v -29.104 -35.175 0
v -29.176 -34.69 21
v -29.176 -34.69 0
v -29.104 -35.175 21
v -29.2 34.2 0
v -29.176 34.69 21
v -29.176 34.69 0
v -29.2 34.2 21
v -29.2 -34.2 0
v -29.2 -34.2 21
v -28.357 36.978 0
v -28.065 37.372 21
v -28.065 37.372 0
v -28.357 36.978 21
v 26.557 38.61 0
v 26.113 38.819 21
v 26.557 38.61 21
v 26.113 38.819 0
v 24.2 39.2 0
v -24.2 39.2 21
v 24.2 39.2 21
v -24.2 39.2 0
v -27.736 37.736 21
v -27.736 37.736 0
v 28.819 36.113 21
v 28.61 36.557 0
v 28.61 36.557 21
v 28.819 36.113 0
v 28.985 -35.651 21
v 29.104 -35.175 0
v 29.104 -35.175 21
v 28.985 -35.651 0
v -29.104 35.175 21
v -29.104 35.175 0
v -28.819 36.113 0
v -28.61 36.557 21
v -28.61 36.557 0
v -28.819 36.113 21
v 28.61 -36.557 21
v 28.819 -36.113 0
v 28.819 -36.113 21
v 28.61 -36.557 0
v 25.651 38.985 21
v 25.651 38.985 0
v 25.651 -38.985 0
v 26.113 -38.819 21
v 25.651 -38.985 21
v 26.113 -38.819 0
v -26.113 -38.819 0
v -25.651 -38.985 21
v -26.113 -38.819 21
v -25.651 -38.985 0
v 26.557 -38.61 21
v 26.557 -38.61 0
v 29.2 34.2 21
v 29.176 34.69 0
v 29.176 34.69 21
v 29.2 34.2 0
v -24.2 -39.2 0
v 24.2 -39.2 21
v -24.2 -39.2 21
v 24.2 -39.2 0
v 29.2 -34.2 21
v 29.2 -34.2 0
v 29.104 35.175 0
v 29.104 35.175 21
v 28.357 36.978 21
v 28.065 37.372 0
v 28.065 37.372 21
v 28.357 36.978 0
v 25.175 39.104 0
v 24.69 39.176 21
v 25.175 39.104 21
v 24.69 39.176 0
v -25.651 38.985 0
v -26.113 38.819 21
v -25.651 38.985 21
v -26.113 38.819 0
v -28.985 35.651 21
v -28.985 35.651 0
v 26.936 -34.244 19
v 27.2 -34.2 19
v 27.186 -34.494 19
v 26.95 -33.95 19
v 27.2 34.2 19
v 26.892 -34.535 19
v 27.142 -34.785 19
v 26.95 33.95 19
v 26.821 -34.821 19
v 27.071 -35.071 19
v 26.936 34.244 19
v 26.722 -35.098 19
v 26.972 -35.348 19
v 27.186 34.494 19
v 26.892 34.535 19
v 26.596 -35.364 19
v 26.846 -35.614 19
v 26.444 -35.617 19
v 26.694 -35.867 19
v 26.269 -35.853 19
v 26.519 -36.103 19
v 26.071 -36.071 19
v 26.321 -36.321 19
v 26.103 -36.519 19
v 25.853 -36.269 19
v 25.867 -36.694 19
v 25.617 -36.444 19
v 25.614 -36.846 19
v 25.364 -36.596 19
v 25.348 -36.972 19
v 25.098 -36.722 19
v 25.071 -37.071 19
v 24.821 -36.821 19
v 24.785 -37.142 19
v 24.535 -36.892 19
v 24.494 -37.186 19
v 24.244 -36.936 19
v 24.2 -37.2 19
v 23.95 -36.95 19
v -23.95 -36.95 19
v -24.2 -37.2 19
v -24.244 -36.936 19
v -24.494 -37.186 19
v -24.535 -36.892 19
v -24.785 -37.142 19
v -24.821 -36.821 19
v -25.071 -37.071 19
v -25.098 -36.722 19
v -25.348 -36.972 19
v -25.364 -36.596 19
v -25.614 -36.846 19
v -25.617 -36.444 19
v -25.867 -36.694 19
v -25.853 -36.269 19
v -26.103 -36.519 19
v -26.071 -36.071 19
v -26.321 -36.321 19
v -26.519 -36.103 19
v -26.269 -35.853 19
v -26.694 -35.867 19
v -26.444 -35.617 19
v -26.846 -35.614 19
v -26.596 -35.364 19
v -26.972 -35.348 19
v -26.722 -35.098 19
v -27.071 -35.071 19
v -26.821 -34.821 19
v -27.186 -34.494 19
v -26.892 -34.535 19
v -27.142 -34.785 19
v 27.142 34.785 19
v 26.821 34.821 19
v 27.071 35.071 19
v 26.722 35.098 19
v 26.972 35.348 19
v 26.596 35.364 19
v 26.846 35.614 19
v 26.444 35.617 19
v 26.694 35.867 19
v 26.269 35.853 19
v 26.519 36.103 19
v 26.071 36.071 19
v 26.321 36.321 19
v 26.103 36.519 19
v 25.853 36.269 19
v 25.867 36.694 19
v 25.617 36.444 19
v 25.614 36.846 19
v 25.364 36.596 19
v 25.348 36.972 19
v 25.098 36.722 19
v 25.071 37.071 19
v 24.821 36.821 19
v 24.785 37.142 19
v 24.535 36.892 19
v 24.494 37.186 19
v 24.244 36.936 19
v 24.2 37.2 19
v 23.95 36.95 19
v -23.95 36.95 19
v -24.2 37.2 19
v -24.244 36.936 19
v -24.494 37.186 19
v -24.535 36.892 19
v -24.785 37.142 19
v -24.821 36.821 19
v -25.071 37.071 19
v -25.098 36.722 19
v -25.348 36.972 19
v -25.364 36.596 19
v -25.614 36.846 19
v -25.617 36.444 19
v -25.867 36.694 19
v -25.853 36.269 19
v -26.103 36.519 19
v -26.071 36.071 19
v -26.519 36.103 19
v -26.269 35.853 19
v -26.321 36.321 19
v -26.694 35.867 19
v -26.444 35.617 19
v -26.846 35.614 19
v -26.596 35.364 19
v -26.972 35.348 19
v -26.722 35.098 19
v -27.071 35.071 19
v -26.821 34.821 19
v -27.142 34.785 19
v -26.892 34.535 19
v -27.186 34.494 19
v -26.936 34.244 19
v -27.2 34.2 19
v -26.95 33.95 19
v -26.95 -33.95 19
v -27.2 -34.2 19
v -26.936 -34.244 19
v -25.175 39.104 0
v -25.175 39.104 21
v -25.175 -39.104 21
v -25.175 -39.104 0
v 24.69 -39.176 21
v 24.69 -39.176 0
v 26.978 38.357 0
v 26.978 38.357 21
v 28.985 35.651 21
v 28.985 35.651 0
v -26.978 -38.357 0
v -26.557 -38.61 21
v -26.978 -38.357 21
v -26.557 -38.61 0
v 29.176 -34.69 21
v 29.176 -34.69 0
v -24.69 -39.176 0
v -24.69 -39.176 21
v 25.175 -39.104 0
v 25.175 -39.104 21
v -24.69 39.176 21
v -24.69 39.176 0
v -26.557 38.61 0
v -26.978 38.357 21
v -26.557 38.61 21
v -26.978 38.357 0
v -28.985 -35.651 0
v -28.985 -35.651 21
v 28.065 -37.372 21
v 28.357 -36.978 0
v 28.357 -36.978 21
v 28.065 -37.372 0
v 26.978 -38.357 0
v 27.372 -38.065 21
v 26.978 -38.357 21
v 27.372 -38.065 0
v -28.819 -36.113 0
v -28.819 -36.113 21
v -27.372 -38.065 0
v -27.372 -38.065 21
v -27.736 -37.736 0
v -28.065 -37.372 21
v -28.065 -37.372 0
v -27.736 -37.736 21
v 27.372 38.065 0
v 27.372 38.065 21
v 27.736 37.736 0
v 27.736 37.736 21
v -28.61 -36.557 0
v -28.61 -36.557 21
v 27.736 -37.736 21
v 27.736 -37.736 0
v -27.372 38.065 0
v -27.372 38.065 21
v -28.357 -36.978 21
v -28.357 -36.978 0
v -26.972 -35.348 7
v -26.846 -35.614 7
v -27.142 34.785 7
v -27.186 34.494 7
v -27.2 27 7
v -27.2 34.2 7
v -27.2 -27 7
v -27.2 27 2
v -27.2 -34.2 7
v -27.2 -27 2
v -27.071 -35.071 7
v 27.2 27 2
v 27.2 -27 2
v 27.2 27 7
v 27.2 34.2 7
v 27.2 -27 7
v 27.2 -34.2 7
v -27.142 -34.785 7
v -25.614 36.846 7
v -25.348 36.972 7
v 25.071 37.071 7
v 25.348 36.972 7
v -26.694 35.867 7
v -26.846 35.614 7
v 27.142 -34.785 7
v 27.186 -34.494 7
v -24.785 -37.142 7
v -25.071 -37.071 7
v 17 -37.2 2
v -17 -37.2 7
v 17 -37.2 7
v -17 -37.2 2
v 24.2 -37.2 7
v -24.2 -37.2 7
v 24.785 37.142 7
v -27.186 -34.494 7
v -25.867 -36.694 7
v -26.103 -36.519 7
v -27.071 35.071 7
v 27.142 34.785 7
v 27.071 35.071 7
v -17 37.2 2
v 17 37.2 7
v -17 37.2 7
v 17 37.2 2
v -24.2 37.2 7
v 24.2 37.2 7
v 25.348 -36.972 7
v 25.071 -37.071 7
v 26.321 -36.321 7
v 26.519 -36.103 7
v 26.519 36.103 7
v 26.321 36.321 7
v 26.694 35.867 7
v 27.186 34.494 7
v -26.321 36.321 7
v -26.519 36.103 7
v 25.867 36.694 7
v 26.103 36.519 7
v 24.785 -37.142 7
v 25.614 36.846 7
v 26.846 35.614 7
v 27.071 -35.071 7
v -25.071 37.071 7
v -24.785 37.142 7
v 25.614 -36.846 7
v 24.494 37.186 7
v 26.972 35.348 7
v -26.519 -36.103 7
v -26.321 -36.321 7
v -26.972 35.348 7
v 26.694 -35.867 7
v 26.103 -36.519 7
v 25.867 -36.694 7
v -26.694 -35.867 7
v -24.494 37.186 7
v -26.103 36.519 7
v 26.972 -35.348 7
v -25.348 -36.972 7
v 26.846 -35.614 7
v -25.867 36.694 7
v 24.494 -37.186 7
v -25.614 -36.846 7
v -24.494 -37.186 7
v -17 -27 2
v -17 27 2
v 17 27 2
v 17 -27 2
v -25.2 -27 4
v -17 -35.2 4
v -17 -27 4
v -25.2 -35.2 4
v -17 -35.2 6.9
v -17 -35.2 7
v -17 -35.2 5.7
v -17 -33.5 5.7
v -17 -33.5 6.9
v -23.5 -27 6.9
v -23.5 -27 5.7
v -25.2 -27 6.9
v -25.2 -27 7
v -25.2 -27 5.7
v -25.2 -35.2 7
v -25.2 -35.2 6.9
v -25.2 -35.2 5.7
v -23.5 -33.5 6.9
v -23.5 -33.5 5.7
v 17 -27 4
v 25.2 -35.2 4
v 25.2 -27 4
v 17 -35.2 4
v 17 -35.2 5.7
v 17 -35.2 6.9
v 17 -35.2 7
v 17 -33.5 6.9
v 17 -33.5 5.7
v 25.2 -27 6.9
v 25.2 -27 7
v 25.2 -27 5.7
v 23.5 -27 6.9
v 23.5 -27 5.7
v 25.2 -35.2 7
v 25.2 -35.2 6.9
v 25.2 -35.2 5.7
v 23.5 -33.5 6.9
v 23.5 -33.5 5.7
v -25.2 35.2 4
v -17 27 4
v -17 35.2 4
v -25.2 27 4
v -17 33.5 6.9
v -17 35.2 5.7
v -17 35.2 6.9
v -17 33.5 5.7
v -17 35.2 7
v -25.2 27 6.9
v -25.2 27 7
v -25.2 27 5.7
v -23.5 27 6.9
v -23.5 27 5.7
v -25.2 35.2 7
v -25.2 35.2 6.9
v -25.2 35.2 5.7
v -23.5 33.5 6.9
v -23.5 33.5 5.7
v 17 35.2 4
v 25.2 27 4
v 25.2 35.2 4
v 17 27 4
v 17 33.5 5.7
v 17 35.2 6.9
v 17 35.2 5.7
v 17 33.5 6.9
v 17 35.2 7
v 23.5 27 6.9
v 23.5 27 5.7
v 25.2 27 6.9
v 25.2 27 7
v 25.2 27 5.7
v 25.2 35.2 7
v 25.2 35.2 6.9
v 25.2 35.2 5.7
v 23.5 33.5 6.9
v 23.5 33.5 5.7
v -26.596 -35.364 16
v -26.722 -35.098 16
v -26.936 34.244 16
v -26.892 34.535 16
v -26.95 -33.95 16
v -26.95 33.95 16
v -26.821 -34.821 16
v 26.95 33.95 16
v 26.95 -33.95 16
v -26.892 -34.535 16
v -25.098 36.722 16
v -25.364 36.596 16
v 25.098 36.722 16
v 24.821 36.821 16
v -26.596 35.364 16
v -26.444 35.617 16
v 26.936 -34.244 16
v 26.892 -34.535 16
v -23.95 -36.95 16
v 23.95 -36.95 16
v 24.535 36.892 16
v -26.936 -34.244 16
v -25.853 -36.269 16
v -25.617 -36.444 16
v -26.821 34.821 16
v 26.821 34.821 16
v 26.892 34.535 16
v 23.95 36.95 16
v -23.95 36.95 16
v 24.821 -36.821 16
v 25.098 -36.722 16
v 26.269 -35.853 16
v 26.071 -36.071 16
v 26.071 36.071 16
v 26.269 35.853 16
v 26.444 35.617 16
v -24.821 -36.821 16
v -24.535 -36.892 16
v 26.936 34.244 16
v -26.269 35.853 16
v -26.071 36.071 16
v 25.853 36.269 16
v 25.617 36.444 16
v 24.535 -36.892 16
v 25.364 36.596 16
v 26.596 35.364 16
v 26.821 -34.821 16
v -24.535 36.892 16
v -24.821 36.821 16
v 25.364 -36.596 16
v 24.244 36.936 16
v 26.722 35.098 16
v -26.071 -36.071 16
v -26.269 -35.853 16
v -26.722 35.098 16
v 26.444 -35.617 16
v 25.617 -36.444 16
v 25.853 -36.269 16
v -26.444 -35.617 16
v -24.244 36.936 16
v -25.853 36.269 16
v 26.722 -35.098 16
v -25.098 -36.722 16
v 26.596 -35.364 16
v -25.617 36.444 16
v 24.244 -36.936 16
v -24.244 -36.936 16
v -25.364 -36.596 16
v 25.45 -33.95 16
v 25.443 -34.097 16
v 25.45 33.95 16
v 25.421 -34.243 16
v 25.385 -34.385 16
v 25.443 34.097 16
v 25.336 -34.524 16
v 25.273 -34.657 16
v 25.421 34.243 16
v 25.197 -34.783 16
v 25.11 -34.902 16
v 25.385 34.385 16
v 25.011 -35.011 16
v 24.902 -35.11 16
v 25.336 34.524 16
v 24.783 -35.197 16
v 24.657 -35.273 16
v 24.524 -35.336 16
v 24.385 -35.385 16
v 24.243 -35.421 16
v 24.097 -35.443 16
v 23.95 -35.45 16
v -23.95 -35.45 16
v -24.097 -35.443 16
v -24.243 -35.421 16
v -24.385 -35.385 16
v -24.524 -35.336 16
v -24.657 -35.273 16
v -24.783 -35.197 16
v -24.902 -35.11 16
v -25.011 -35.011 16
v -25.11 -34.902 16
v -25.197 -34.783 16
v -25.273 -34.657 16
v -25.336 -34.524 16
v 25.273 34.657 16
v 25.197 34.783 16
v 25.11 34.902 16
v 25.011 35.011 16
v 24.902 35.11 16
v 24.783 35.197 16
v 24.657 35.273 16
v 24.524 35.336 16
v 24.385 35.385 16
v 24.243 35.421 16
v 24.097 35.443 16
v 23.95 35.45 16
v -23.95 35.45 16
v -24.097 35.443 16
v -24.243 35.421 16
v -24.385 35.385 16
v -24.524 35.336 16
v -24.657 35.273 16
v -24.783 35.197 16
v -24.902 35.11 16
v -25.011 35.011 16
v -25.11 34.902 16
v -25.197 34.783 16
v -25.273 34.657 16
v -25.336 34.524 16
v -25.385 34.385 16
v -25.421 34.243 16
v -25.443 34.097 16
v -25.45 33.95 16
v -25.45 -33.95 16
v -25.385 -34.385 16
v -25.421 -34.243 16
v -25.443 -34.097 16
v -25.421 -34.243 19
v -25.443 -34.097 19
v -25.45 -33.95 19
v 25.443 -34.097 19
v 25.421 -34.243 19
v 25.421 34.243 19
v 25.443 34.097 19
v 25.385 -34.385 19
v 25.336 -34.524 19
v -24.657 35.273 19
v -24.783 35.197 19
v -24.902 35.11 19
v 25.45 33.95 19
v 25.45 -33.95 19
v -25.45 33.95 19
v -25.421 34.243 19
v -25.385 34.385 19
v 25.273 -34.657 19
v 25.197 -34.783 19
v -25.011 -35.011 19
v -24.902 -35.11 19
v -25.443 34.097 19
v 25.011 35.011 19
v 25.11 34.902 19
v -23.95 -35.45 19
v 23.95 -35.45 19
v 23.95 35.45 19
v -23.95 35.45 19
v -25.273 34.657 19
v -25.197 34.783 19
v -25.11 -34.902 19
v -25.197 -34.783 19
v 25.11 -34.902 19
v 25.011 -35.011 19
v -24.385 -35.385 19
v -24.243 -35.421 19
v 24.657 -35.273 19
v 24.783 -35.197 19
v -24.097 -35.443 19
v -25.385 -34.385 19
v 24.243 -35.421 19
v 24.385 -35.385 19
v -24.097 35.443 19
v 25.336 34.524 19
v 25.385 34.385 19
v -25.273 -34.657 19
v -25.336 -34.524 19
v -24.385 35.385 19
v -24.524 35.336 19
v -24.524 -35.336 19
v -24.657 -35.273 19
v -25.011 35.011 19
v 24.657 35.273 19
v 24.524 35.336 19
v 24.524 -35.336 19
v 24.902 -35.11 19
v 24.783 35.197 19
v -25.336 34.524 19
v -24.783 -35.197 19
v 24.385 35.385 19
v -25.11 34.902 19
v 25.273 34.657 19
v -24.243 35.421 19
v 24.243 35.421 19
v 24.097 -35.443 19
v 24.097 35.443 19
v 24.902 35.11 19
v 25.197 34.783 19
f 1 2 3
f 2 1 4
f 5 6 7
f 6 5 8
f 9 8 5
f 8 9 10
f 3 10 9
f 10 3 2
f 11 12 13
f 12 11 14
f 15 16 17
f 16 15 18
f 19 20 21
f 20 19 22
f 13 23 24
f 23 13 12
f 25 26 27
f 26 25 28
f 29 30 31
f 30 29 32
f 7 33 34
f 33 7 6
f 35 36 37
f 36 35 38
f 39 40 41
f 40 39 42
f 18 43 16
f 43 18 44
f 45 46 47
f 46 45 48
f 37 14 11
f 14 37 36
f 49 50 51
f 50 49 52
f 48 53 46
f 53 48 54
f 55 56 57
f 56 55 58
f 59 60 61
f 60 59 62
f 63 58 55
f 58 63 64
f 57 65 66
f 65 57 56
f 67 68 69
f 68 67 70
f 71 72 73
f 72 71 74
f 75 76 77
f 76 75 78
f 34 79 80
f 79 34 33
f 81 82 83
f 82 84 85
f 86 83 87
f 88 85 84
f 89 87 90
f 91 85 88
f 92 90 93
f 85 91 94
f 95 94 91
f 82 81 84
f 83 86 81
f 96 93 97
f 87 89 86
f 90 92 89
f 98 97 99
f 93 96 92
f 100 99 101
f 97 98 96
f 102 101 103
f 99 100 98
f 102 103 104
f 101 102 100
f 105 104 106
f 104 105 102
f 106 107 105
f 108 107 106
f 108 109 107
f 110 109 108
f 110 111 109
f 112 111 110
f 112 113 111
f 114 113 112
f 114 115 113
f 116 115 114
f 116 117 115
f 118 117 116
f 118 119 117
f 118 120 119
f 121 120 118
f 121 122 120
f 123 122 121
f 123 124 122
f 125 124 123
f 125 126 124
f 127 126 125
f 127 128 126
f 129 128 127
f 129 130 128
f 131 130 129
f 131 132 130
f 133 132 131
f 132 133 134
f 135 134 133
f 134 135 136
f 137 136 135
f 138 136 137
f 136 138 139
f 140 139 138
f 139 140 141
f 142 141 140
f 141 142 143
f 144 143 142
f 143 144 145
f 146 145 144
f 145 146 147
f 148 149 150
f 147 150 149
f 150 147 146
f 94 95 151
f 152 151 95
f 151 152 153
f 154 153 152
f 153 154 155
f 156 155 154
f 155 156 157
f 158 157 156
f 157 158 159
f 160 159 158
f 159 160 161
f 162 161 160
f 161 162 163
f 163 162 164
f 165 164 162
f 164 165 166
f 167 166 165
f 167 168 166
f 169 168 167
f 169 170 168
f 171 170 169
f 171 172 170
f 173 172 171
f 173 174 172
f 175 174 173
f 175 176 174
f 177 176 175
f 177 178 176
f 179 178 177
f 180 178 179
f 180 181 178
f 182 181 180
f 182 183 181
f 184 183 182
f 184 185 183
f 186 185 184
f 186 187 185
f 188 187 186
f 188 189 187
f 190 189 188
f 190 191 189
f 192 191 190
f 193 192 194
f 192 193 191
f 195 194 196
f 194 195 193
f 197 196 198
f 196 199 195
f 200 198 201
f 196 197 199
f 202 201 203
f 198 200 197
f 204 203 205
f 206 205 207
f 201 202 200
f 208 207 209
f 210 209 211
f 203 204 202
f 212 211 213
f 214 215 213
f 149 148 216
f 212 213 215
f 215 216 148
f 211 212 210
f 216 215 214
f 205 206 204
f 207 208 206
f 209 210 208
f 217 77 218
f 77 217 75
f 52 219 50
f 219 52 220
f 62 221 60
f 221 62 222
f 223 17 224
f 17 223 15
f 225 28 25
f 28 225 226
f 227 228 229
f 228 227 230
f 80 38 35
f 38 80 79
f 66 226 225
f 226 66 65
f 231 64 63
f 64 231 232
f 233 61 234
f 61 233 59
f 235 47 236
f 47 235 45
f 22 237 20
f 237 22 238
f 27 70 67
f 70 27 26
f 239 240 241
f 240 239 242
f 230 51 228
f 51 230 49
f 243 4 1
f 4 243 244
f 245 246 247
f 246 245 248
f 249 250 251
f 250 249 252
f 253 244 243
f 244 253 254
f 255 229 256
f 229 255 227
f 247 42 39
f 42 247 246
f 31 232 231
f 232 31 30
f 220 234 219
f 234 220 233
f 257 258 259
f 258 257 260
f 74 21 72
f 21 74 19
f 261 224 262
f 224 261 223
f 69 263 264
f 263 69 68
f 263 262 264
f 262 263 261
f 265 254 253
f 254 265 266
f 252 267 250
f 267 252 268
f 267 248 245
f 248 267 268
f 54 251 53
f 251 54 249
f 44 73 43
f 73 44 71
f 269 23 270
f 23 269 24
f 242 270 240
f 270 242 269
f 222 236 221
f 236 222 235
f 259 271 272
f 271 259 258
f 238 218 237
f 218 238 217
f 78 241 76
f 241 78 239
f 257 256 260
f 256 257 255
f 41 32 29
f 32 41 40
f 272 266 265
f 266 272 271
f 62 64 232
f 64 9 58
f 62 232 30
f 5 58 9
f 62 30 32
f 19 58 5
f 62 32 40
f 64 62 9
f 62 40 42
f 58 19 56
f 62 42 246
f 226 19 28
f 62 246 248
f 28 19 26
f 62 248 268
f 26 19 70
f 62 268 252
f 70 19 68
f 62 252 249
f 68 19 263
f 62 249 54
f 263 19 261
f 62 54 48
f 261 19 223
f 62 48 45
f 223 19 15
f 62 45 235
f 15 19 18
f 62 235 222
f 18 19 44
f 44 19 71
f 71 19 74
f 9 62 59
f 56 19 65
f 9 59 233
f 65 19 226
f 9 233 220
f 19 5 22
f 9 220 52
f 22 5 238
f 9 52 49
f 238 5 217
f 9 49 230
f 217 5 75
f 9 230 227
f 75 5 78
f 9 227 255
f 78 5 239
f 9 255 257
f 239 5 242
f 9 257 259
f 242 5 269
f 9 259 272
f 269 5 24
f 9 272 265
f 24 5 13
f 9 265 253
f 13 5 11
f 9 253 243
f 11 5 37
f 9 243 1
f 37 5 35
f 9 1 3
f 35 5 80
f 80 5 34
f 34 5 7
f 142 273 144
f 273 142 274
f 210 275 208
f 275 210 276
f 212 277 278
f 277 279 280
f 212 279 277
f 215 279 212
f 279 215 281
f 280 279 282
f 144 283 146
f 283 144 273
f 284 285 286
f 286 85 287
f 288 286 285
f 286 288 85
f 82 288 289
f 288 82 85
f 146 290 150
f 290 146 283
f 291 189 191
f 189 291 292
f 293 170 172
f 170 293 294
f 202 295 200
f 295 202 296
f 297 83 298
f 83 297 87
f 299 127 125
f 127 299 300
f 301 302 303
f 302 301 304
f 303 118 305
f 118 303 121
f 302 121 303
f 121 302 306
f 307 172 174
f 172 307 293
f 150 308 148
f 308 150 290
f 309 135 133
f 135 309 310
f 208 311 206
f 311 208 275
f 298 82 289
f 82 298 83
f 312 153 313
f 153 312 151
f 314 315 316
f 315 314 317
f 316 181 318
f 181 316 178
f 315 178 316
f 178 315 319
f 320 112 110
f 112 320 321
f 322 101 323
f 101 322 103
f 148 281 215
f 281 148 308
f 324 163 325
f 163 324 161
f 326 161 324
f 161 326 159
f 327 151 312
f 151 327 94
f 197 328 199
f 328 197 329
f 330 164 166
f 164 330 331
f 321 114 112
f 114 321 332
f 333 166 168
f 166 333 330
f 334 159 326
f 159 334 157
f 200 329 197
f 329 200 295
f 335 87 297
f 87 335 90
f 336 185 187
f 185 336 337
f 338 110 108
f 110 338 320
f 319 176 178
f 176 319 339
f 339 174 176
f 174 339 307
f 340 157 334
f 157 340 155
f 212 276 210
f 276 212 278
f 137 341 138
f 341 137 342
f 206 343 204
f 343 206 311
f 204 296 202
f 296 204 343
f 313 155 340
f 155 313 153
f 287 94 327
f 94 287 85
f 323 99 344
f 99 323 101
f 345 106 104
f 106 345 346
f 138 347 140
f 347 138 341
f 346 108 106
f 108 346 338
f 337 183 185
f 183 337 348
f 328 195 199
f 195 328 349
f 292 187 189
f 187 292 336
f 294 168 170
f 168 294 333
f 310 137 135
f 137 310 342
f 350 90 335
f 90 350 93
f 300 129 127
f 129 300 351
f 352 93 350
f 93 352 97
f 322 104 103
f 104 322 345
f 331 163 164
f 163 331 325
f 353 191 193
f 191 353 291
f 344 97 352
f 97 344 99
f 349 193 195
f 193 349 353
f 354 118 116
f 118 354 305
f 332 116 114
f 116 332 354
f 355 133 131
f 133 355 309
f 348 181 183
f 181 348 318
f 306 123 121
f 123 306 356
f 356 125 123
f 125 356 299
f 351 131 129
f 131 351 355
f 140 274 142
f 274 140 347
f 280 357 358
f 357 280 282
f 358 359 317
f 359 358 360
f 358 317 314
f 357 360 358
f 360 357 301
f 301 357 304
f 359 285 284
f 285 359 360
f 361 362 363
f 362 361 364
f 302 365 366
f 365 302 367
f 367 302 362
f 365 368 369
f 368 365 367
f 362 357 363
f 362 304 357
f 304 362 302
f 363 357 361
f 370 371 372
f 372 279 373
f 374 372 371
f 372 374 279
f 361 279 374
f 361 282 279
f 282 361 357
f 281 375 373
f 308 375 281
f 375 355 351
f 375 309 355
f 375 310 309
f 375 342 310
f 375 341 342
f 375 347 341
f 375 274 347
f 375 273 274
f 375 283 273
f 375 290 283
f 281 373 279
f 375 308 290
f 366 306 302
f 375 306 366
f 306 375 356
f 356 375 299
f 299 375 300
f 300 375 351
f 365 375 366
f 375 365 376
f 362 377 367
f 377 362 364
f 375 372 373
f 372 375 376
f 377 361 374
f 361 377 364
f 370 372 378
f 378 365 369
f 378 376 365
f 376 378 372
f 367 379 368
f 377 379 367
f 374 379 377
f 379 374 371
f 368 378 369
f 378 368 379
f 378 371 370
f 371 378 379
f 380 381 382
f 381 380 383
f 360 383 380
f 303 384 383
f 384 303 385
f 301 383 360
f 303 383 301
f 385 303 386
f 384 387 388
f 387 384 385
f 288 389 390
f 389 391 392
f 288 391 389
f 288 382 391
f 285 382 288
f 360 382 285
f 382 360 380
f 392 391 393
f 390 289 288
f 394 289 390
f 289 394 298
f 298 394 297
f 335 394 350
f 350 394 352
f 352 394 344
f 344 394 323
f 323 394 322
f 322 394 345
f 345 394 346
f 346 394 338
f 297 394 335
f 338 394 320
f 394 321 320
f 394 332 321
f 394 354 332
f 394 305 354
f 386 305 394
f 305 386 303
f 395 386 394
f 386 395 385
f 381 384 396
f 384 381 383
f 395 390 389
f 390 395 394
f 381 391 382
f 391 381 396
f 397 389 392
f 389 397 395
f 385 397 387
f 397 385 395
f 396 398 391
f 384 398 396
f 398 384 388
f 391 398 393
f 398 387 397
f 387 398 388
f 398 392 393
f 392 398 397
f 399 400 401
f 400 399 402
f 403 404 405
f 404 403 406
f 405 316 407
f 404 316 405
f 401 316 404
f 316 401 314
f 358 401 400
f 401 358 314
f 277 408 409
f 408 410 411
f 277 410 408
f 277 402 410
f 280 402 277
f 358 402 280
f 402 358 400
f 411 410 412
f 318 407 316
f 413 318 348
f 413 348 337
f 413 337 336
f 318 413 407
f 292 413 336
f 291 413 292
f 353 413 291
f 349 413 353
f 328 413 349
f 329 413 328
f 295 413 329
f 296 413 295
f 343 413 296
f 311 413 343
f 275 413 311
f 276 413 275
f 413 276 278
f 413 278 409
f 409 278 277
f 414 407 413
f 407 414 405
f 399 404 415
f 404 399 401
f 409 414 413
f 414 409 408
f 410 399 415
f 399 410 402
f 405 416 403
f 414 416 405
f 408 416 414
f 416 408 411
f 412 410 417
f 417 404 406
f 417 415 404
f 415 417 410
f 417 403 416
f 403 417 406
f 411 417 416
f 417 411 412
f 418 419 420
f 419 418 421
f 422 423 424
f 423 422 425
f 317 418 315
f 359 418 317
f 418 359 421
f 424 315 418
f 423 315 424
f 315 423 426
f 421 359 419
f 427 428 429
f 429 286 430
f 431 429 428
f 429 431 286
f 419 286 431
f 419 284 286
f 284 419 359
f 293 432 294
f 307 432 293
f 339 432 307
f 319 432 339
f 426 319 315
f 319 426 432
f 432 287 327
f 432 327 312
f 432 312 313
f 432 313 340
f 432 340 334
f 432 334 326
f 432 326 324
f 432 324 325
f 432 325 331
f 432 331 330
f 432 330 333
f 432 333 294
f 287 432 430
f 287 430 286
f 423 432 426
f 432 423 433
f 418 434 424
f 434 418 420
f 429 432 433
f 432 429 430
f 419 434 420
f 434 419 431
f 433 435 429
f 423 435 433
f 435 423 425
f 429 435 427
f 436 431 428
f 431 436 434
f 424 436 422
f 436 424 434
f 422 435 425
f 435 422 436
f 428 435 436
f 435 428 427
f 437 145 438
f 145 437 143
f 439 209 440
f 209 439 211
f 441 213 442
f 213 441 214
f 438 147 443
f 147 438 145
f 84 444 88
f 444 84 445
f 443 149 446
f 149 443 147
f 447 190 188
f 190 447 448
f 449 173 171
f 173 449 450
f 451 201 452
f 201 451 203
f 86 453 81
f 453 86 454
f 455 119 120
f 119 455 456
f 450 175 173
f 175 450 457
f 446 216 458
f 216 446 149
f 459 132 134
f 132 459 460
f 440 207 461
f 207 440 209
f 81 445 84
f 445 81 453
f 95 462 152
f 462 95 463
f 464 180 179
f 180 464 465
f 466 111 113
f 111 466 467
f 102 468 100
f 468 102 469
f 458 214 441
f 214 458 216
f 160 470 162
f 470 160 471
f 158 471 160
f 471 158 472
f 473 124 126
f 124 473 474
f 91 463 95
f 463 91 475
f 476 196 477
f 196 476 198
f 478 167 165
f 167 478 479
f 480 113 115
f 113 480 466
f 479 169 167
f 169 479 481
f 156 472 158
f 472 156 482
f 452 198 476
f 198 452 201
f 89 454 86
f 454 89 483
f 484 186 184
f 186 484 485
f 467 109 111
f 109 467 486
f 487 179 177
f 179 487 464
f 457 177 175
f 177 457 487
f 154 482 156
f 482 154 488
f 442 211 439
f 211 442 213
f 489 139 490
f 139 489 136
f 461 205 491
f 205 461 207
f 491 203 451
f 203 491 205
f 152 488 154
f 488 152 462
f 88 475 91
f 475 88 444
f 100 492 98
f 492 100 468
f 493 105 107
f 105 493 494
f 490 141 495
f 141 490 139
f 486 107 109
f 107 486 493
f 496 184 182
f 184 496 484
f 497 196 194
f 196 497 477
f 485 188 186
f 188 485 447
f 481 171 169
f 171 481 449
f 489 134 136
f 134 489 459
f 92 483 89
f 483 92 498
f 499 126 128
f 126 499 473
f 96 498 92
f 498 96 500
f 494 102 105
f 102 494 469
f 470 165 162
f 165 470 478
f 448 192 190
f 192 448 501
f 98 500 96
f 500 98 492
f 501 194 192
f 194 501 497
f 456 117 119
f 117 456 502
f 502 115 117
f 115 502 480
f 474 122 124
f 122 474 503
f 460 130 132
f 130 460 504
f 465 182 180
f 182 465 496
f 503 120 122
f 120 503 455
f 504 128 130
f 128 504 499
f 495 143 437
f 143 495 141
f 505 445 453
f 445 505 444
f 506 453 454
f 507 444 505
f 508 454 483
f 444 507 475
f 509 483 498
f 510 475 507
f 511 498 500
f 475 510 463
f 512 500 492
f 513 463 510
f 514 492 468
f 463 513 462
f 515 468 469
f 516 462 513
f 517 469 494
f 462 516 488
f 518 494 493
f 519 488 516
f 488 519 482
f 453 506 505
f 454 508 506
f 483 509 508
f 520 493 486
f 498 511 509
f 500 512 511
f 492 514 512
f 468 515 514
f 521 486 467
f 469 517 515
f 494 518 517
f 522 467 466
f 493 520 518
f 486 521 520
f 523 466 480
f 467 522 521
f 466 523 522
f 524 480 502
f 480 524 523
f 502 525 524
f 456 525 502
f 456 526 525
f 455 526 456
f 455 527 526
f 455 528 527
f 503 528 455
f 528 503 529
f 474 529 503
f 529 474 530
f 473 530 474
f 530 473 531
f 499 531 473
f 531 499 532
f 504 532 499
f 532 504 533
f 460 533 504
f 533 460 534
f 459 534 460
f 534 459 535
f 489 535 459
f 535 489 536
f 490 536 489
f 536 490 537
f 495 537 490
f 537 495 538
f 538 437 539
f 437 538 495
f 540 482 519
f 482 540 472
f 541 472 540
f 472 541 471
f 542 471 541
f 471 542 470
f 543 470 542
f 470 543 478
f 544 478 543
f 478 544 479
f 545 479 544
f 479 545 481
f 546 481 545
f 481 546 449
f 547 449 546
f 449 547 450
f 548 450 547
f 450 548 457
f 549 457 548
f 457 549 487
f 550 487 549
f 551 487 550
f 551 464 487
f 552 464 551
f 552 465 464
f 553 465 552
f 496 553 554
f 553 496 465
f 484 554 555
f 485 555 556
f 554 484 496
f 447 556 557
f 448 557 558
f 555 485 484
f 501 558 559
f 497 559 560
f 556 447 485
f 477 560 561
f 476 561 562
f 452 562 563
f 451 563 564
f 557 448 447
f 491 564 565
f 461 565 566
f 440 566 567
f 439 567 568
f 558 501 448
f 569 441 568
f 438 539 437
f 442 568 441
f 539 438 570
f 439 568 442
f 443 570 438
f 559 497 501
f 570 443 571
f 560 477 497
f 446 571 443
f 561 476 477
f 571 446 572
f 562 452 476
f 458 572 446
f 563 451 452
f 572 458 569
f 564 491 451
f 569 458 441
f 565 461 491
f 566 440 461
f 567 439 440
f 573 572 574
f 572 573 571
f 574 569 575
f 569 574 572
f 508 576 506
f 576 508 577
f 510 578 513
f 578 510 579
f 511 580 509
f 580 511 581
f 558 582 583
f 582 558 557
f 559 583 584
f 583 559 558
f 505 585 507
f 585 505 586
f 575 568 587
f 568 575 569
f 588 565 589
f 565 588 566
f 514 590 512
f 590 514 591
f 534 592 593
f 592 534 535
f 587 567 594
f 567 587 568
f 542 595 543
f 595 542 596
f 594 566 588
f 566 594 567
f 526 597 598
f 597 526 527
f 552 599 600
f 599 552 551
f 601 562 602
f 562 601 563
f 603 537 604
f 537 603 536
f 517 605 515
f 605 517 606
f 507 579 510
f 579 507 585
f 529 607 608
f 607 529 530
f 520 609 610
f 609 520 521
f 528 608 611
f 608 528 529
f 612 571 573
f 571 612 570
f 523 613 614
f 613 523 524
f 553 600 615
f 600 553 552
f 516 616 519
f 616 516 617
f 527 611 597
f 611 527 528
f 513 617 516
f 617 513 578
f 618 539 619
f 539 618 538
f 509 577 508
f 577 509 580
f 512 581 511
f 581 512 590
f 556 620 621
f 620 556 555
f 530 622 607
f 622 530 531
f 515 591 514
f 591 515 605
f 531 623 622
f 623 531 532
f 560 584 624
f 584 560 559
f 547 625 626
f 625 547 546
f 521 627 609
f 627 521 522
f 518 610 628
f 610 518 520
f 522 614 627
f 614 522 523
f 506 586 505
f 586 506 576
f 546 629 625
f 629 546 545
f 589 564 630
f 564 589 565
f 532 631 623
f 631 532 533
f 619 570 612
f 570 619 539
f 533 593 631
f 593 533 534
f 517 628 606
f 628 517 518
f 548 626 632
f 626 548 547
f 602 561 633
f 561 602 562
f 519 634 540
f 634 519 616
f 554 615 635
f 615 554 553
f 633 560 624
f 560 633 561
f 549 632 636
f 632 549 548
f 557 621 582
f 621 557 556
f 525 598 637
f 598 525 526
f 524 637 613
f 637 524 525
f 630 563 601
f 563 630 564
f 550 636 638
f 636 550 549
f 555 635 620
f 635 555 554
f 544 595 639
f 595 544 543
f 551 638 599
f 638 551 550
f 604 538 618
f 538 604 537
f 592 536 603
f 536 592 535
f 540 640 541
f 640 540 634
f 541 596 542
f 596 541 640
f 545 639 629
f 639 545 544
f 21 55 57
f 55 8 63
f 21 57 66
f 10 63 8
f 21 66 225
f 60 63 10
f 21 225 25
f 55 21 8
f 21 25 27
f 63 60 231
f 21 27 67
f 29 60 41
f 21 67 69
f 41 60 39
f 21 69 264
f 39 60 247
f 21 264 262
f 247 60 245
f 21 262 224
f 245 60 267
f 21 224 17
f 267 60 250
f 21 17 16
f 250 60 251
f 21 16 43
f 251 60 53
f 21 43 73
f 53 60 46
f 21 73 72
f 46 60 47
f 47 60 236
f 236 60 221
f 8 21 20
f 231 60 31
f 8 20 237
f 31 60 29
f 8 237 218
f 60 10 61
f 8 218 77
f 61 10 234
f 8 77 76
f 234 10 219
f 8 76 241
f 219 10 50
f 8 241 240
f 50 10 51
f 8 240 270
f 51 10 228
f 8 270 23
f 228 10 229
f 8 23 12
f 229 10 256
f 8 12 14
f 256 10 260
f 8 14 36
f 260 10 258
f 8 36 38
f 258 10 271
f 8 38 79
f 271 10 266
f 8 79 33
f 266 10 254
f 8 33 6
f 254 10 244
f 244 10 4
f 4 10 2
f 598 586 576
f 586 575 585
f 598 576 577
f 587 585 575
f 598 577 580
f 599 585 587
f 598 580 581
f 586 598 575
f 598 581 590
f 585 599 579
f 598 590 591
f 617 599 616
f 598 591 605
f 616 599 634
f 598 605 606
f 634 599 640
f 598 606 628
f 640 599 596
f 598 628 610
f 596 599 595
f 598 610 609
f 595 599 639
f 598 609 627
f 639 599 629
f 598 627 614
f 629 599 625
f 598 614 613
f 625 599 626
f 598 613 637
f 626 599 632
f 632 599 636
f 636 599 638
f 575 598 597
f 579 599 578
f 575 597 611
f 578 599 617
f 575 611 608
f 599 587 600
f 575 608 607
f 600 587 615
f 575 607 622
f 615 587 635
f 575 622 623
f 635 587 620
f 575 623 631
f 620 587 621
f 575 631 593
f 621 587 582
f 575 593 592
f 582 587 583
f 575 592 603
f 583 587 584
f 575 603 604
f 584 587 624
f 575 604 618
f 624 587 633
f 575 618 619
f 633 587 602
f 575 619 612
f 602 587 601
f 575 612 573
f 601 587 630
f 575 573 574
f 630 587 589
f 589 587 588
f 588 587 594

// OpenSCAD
// file: ../../lib/cut_plane_viewer.scad
// ============================================================
//  cut_plane_viewer — interactive cut-plane viewer for the OpenSCAD GUI.
//
//  cut_plane_view(axis, pos, show) wraps a part and shows a section plane at
//  axis = pos four ways, so you sweep CUT_POS in the Customizer and read where
//  / how the plane cuts:
//    "off"   — just the part, no plane (the clean default view: this is why it can
//              live at the end of a main.scad without changing its default render).
//    "plane" — part + a translucent red plane at pos (WHERE it cuts).
//    "cut"   — part clipped at the plane (half-space): the cross-section in 3D,
//              in place (a cutaway view).
//    "slice" — the TRUE 2D cross-section, extruded thin and placed back ON the
//              cut plane (in situ): the clean outline, where it actually cuts.
//
//  Self-contained (no `use`/`include`): the 2D section uses the slice.scad
//  projection convention INLINE (z: img=XY · x: img=Y,Z · y: img=X,Z; det +1,
//  no mirror). So tools/make_assembly.py can either `use <cut_plane_viewer.scad>`
//  (in-repo project files) or copy these module defs verbatim into a portable,
//  dependency-free stl_assembly.scad — ONE source either way.
//
//  Inspection-only geometry (never part of a printed piece). It lives in lib/
//  because it is reusable .scad consumed by the main.scad front doors, even
//  though it is not a geometric primitive (see lib/CLAUDE.md). Drive it from a
//  Customizer file; never `include` (it would leak the
//  self-preview). The block between the first `module` and the Self-preview line
//  is what make_assembly inlines, so keep all state in module defaults (no
//  top-level constants there).
// ============================================================
module cut_plane_view(axis = "x", pos = 0, show = "off", plane_size = 300) {
    if (show == "off") children();
    else if (show == "cut") intersection() { children(); _cpv_half(axis, pos); }
    else if (show == "slice") _cpv_slice(axis, pos) children();
    else { children(); color([0.85, 0.10, 0.10, 0.33]) _cpv_plane(axis, pos, plane_size); }
}
module _cpv_plane(axis, pos, s = 300, th = 0.6) {
    if (axis == "x")      translate([pos, 0, 0]) cube([th, s, s], center = true);
    else if (axis == "y") translate([0, pos, 0]) cube([s, th, s], center = true);
    else                  translate([0, 0, pos]) cube([s, s, th], center = true);
}
module _cpv_half(axis, pos, b = 1000) {
    if (axis == "x")      translate([pos - b, -b/2, -b/2]) cube(b);
    else if (axis == "y") translate([-b/2, pos - b, -b/2]) cube(b);
    else                  translate([-b/2, -b/2, pos - b]) cube(b);
}
module _cpv_section(axis, pos) {
    if (axis == "z") projection(cut = true) translate([0, 0, -pos]) children();
    else if (axis == "x") projection(cut = true)
        multmatrix([[0,1,0,0],[0,0,1,0],[1,0,0,-pos],[0,0,0,1]]) children();
    else projection(cut = true)
        multmatrix([[1,0,0,0],[0,0,1,0],[0,-1,0,pos],[0,0,0,1]]) children();
}
module _cpv_slice(axis, pos, th = 0.6) {
    if (axis == "z") translate([0,0,pos])
        linear_extrude(th, center=true) _cpv_section("z", pos) children();
    else if (axis == "x") translate([pos,0,0]) rotate([90,0,90])
        linear_extrude(th, center=true) _cpv_section("x", pos) children();
    else translate([0,pos,0]) rotate([90,0,0])
        linear_extrude(th, center=true) _cpv_section("y", pos) children();
}

// ---------- Self-preview (top-level; `use <...>` ignores it — never `include`) ----------
$fn = 48;
cut_plane_view("x", 4, "cut") difference() { cube(30, center = true); sphere(18); }
// file: modules/example_config.scad
// ============================================================
//  example_config.scad — constants for the starter enclosure.
//
//  `include`d (not `use`d) by the pieces, so these are plain variables.
//  No geometry here, and no self-preview: an `include` would leak it into
//  every importer.
//
//  Every constant carries its provenance: MEASURED = verified with calipers
//  against the real part; ADJUST = an estimate, to be confirmed. Flip the tag
//  in place when the measurement arrives, and never delete the trail.
// ============================================================

// ---- the board this box houses ---------------------------------------------
// The defaults of the pcb_holder component: a generic 50 × 70 board. Swap these
// for your own and everything below follows.
BOX_PCB_W = 50;   // ADJUST: PCB width  (X, mm)
BOX_PCB_L = 70;   // ADJUST: PCB length (Y, mm)
BOX_PCB_T = 1.5;  // ADJUST: PCB thickness (mm)

// ---- what the component reserves around the board --------------------------
// pcb_holder puts an L-shaped wall of PCBH_WALL outside each PCB corner, with
// PCBH_FIT of play per side. The cavity has to clear both, or the holders would
// not fit inside their own box.
BOX_FIT         = 0.2;  // ADJUST: XY play between PCB edge and holder (per side) = PCBH_FIT
BOX_HOLDER_WALL = 2;    // ADJUST: holder outer wall = PCBH_WALL
BOX_HOLDER_H    = 5.0;  // ADJUST: total holder height, = pcb_holder_height() with the
                        // component defaults (standoff 2 + ref PCB 1.6 + slot 0.2 + lip 1.2).
                        // Mirrored here, so revisit it if the component's defaults move.

// ---- the enclosure ---------------------------------------------------------
BOX_WALL     = 2;    // ADJUST: outer wall thickness (mm)
BOX_FLOOR    = 2;    // ADJUST: floor thickness (mm)
BOX_HEADROOM = 12;   // ADJUST: free height above the holder lip, for tall components
BOX_CORNER_R = 3;    // ADJUST: inner corner radius in plan (mm)

// ---- the lid ---------------------------------------------------------------
BOX_LID_T   = 2;     // ADJUST: lid plate thickness (mm)
BOX_LIP_H   = 3;     // ADJUST: depth the lid lip plugs into the cavity (mm)
BOX_LIP_T   = 1.5;   // ADJUST: wall thickness of that lip — it is a rim, not a slab
BOX_LID_CL  = 0.25;  // ADJUST: play of that lip against the cavity wall (per side)

BOX_EPS = 0.05;      // local manifold fudge: overhang for cutters, overlap for unions

// ---- derived (functions, so `use` can read them from another file) ----------
// Cavity = board + the component's own footprint. Everything else hangs off this.
function box_cav_w() = BOX_PCB_W + 2 * (BOX_FIT + BOX_HOLDER_WALL);
function box_cav_l() = BOX_PCB_L + 2 * (BOX_FIT + BOX_HOLDER_WALL);
function box_cav_h() = BOX_HOLDER_H + BOX_HEADROOM;

function box_outer_w() = box_cav_w() + 2 * BOX_WALL;
function box_outer_l() = box_cav_l() + 2 * BOX_WALL;

// z of the rim the lid lands on (top of the base walls).
function box_rim_z() = BOX_FLOOR + box_cav_h();
// file: modules/lid.scad
// ============================================================
//  lid.scad — the cover of the starter enclosure: a plate with a lip that
//  plugs into the cavity and keeps it located.
//
//  Frame: XY centred like the base, and z = 0 at the MATING PLANE (the rim of
//  the base). The plate grows upward, the lip hangs downward — so in the
//  assembly it is just `translate([0, 0, box_rim_z()]) lid()`.
//  Piece, not a front door: it does NOT set $fn — main.scad does.
// ============================================================

use <../../../lib/rounded.scad>
include <example_config.scad>

module lid() {
    // The plate: same footprint as the box, so the outside is flush.
    translate([0, 0, BOX_LID_T / 2])
        rounded_flat_cube(box_outer_w(), box_outer_l(), BOX_LID_T,
                          BOX_CORNER_R + BOX_WALL);

    // The lip that enters the cavity, minus its clearance per side. It is a RIM,
    // not a slab: a solid plug would fill the box with plastic and leave no room
    // for anything standing on the board. It overlaps the plate by BOX_EPS —
    // a union of merely touching solids is a zero-thickness contact.
    lip_w = box_cav_w() - 2 * BOX_LID_CL;
    lip_l = box_cav_l() - 2 * BOX_LID_CL;
    translate([0, 0, -(BOX_LIP_H - BOX_EPS) / 2])
        difference() {
            rounded_flat_cube(lip_w, lip_l, BOX_LIP_H + BOX_EPS, BOX_CORNER_R);
            // Hollow it out. The cutter pokes past both ends so neither face is
            // left coplanar with the rim's.
            rounded_flat_cube(lip_w - 2 * BOX_LIP_T, lip_l - 2 * BOX_LIP_T,
                              BOX_LIP_H + BOX_EPS + 2 * BOX_EPS,
                              max(BOX_CORNER_R - BOX_LIP_T, 0.1));
        }
}

// ---------- Self-preview (top-level; `use <...>` ignores it) ----------
$fn = 64;
lid();
// file: modules/base.scad
// ============================================================
//  base.scad — the tray of the starter enclosure: a rounded shell, open on
//  top, with the PCB retainers standing on its floor.
//
//  This is the piece that shows the three layers working together:
//    · lib/rounded.scad     → the shell (a generic primitive)
//    · components/pcb_holder → the retainers (a concrete reusable part)
//    · this file             → the design that combines them
//
//  Frame: XY centred on the PCB, z = 0 at the bottom of the box (the print bed).
//  Piece, not a front door: it does NOT set $fn — main.scad does.
// ============================================================

use <../../../lib/rounded.scad>
use <../../../components/pcb_holder.scad>
include <example_config.scad>

// Invariants. They live in a module and get CALLED from the geometry, because
// OpenSCAD skips top-level statements of a file imported with `use` — an assert
// in the header would be silently ignored exactly when it matters.
module _box_asserts() {
    assert(BOX_HOLDER_H == pcb_holder_height(pcb_t = BOX_PCB_T),
           "BOX_HOLDER_H no longer matches pcb_holder_height() — the component moved; re-read its defaults and update the constant (the drawing needs it as a literal).");
}

// The tray: shell minus the cavity, plus the retainers on the floor.
module base() {
    _box_asserts();
    difference() {
        // Outer shell. The outer radius follows the inner one so the wall keeps
        // a constant thickness all the way round the corner.
        translate([0, 0, box_rim_z() / 2])
            rounded_flat_cube(box_outer_w(), box_outer_l(), box_rim_z(),
                              BOX_CORNER_R + BOX_WALL);

        // Cavity, open at the top: the cutter pokes BOX_EPS past the rim so the
        // opening is a real hole and not a coplanar face.
        translate([0, 0, BOX_FLOOR + (box_cav_h() + BOX_EPS) / 2])
            rounded_flat_cube(box_cav_w(), box_cav_l(), box_cav_h() + BOX_EPS,
                              BOX_CORNER_R);
    }

    // The retainers. Their own frame has z = 0 at the host floor, so they get
    // lifted by the floor thickness; the component does the rest.
    translate([0, 0, BOX_FLOOR])
        pcb_holder(width = BOX_PCB_W, length = BOX_PCB_L, pcb_t = BOX_PCB_T);
}

// ---------- Self-preview (top-level; `use <...>` ignores it) ----------
// Opening this file on its own in OpenSCAD shows geometry, not an empty canvas.
// $fn goes here because outside main.scad it is not inherited.
$fn = 64;
base();
// main file
// ============================================================
//  main.scad — front door of example (starter project).
//
//  A small two-piece enclosure for a PCB: a tray that reuses the
//  `pcb_holder` component to retain the board, and a lid that plugs into it.
//  It exists to seed the canonical layout and to show the three layers
//  working together — projects → components → lib.
//
//  main is a catalogue of named modules that forward to the geometry in
//  modules/. A piece is picked by its name (build discovers *_print); there is
//  no RENDER variable. Delete the whole projects/example/ folder once you have
//  your pieces.
//    ./build.sh example                      # one STL per *_print
//    uv run tools/run_batch.py projects/example/main.scad
// ============================================================

use <modules/base.scad>
use <modules/lid.scad>
use <../../components/pcb_holder.scad>
include <modules/example_config.scad>

$fn = 180;                 // print-quality baseline (override -D '$fn=24' for preview)

// ── Printable deliverables (build discovers *_print) ──
// Print-bed orientation lives HERE. The tray already sits open-side up; the lid
// is flipped so its flat outer face goes on the bed and the lip points up.
module base_print() base();
module lid_print() translate([0, 0, BOX_LID_T]) rotate([180, 0, 0]) lid();

// ── Inspection solids (slice/run_batch discover *_solid) ──
// Each in its assembled pose, so a section cuts them where they really meet.
module base_solid() base();
module lid_solid() translate([0, 0, box_rim_z()]) lid();

// ── Assembly ──
// The board is a ghost: it is the reference the holders capture, not a part we print.
module assembly() {
    base_solid();
    lid_solid();
    %translate([0, 0, BOX_FLOOR]) pcb_holder_pcb(width = BOX_PCB_W, length = BOX_PCB_L,
                                                 pcb_t = BOX_PCB_T);
}

// All-solid twin of the showcase: the % ghost above is invisible to a cut view,
// so the viewer wraps this one instead. NOTE the name does NOT end in `_solid`:
// slice/run_batch discover pieces by that suffix, and a composite that matched
// would be sectioned as one more piece, duplicating the geometry of the others.
module assembly_all() {
    base_solid();
    lid_solid();
}

// ── Default view + cut inspection in the Customizer ──
// `use <main>` ignores these top-level statements (variables + call): the tools only
// see the modules above. Open main.scad in the GUI and move SHOW/CUT_POS to sweep
// the cut plane; SHOW="off" = the usual clean view.
use <../../lib/cut_plane_viewer.scad>
/* [Inspect cut plane] */
CUT_AXIS = "y";   // [x, y, z]
CUT_POS  = 0;     // [-45:1:45]
SHOW     = "off"; // [off, plane, cut, slice]
cut_plane_view(CUT_AXIS, CUT_POS, SHOW) assembly_all();
